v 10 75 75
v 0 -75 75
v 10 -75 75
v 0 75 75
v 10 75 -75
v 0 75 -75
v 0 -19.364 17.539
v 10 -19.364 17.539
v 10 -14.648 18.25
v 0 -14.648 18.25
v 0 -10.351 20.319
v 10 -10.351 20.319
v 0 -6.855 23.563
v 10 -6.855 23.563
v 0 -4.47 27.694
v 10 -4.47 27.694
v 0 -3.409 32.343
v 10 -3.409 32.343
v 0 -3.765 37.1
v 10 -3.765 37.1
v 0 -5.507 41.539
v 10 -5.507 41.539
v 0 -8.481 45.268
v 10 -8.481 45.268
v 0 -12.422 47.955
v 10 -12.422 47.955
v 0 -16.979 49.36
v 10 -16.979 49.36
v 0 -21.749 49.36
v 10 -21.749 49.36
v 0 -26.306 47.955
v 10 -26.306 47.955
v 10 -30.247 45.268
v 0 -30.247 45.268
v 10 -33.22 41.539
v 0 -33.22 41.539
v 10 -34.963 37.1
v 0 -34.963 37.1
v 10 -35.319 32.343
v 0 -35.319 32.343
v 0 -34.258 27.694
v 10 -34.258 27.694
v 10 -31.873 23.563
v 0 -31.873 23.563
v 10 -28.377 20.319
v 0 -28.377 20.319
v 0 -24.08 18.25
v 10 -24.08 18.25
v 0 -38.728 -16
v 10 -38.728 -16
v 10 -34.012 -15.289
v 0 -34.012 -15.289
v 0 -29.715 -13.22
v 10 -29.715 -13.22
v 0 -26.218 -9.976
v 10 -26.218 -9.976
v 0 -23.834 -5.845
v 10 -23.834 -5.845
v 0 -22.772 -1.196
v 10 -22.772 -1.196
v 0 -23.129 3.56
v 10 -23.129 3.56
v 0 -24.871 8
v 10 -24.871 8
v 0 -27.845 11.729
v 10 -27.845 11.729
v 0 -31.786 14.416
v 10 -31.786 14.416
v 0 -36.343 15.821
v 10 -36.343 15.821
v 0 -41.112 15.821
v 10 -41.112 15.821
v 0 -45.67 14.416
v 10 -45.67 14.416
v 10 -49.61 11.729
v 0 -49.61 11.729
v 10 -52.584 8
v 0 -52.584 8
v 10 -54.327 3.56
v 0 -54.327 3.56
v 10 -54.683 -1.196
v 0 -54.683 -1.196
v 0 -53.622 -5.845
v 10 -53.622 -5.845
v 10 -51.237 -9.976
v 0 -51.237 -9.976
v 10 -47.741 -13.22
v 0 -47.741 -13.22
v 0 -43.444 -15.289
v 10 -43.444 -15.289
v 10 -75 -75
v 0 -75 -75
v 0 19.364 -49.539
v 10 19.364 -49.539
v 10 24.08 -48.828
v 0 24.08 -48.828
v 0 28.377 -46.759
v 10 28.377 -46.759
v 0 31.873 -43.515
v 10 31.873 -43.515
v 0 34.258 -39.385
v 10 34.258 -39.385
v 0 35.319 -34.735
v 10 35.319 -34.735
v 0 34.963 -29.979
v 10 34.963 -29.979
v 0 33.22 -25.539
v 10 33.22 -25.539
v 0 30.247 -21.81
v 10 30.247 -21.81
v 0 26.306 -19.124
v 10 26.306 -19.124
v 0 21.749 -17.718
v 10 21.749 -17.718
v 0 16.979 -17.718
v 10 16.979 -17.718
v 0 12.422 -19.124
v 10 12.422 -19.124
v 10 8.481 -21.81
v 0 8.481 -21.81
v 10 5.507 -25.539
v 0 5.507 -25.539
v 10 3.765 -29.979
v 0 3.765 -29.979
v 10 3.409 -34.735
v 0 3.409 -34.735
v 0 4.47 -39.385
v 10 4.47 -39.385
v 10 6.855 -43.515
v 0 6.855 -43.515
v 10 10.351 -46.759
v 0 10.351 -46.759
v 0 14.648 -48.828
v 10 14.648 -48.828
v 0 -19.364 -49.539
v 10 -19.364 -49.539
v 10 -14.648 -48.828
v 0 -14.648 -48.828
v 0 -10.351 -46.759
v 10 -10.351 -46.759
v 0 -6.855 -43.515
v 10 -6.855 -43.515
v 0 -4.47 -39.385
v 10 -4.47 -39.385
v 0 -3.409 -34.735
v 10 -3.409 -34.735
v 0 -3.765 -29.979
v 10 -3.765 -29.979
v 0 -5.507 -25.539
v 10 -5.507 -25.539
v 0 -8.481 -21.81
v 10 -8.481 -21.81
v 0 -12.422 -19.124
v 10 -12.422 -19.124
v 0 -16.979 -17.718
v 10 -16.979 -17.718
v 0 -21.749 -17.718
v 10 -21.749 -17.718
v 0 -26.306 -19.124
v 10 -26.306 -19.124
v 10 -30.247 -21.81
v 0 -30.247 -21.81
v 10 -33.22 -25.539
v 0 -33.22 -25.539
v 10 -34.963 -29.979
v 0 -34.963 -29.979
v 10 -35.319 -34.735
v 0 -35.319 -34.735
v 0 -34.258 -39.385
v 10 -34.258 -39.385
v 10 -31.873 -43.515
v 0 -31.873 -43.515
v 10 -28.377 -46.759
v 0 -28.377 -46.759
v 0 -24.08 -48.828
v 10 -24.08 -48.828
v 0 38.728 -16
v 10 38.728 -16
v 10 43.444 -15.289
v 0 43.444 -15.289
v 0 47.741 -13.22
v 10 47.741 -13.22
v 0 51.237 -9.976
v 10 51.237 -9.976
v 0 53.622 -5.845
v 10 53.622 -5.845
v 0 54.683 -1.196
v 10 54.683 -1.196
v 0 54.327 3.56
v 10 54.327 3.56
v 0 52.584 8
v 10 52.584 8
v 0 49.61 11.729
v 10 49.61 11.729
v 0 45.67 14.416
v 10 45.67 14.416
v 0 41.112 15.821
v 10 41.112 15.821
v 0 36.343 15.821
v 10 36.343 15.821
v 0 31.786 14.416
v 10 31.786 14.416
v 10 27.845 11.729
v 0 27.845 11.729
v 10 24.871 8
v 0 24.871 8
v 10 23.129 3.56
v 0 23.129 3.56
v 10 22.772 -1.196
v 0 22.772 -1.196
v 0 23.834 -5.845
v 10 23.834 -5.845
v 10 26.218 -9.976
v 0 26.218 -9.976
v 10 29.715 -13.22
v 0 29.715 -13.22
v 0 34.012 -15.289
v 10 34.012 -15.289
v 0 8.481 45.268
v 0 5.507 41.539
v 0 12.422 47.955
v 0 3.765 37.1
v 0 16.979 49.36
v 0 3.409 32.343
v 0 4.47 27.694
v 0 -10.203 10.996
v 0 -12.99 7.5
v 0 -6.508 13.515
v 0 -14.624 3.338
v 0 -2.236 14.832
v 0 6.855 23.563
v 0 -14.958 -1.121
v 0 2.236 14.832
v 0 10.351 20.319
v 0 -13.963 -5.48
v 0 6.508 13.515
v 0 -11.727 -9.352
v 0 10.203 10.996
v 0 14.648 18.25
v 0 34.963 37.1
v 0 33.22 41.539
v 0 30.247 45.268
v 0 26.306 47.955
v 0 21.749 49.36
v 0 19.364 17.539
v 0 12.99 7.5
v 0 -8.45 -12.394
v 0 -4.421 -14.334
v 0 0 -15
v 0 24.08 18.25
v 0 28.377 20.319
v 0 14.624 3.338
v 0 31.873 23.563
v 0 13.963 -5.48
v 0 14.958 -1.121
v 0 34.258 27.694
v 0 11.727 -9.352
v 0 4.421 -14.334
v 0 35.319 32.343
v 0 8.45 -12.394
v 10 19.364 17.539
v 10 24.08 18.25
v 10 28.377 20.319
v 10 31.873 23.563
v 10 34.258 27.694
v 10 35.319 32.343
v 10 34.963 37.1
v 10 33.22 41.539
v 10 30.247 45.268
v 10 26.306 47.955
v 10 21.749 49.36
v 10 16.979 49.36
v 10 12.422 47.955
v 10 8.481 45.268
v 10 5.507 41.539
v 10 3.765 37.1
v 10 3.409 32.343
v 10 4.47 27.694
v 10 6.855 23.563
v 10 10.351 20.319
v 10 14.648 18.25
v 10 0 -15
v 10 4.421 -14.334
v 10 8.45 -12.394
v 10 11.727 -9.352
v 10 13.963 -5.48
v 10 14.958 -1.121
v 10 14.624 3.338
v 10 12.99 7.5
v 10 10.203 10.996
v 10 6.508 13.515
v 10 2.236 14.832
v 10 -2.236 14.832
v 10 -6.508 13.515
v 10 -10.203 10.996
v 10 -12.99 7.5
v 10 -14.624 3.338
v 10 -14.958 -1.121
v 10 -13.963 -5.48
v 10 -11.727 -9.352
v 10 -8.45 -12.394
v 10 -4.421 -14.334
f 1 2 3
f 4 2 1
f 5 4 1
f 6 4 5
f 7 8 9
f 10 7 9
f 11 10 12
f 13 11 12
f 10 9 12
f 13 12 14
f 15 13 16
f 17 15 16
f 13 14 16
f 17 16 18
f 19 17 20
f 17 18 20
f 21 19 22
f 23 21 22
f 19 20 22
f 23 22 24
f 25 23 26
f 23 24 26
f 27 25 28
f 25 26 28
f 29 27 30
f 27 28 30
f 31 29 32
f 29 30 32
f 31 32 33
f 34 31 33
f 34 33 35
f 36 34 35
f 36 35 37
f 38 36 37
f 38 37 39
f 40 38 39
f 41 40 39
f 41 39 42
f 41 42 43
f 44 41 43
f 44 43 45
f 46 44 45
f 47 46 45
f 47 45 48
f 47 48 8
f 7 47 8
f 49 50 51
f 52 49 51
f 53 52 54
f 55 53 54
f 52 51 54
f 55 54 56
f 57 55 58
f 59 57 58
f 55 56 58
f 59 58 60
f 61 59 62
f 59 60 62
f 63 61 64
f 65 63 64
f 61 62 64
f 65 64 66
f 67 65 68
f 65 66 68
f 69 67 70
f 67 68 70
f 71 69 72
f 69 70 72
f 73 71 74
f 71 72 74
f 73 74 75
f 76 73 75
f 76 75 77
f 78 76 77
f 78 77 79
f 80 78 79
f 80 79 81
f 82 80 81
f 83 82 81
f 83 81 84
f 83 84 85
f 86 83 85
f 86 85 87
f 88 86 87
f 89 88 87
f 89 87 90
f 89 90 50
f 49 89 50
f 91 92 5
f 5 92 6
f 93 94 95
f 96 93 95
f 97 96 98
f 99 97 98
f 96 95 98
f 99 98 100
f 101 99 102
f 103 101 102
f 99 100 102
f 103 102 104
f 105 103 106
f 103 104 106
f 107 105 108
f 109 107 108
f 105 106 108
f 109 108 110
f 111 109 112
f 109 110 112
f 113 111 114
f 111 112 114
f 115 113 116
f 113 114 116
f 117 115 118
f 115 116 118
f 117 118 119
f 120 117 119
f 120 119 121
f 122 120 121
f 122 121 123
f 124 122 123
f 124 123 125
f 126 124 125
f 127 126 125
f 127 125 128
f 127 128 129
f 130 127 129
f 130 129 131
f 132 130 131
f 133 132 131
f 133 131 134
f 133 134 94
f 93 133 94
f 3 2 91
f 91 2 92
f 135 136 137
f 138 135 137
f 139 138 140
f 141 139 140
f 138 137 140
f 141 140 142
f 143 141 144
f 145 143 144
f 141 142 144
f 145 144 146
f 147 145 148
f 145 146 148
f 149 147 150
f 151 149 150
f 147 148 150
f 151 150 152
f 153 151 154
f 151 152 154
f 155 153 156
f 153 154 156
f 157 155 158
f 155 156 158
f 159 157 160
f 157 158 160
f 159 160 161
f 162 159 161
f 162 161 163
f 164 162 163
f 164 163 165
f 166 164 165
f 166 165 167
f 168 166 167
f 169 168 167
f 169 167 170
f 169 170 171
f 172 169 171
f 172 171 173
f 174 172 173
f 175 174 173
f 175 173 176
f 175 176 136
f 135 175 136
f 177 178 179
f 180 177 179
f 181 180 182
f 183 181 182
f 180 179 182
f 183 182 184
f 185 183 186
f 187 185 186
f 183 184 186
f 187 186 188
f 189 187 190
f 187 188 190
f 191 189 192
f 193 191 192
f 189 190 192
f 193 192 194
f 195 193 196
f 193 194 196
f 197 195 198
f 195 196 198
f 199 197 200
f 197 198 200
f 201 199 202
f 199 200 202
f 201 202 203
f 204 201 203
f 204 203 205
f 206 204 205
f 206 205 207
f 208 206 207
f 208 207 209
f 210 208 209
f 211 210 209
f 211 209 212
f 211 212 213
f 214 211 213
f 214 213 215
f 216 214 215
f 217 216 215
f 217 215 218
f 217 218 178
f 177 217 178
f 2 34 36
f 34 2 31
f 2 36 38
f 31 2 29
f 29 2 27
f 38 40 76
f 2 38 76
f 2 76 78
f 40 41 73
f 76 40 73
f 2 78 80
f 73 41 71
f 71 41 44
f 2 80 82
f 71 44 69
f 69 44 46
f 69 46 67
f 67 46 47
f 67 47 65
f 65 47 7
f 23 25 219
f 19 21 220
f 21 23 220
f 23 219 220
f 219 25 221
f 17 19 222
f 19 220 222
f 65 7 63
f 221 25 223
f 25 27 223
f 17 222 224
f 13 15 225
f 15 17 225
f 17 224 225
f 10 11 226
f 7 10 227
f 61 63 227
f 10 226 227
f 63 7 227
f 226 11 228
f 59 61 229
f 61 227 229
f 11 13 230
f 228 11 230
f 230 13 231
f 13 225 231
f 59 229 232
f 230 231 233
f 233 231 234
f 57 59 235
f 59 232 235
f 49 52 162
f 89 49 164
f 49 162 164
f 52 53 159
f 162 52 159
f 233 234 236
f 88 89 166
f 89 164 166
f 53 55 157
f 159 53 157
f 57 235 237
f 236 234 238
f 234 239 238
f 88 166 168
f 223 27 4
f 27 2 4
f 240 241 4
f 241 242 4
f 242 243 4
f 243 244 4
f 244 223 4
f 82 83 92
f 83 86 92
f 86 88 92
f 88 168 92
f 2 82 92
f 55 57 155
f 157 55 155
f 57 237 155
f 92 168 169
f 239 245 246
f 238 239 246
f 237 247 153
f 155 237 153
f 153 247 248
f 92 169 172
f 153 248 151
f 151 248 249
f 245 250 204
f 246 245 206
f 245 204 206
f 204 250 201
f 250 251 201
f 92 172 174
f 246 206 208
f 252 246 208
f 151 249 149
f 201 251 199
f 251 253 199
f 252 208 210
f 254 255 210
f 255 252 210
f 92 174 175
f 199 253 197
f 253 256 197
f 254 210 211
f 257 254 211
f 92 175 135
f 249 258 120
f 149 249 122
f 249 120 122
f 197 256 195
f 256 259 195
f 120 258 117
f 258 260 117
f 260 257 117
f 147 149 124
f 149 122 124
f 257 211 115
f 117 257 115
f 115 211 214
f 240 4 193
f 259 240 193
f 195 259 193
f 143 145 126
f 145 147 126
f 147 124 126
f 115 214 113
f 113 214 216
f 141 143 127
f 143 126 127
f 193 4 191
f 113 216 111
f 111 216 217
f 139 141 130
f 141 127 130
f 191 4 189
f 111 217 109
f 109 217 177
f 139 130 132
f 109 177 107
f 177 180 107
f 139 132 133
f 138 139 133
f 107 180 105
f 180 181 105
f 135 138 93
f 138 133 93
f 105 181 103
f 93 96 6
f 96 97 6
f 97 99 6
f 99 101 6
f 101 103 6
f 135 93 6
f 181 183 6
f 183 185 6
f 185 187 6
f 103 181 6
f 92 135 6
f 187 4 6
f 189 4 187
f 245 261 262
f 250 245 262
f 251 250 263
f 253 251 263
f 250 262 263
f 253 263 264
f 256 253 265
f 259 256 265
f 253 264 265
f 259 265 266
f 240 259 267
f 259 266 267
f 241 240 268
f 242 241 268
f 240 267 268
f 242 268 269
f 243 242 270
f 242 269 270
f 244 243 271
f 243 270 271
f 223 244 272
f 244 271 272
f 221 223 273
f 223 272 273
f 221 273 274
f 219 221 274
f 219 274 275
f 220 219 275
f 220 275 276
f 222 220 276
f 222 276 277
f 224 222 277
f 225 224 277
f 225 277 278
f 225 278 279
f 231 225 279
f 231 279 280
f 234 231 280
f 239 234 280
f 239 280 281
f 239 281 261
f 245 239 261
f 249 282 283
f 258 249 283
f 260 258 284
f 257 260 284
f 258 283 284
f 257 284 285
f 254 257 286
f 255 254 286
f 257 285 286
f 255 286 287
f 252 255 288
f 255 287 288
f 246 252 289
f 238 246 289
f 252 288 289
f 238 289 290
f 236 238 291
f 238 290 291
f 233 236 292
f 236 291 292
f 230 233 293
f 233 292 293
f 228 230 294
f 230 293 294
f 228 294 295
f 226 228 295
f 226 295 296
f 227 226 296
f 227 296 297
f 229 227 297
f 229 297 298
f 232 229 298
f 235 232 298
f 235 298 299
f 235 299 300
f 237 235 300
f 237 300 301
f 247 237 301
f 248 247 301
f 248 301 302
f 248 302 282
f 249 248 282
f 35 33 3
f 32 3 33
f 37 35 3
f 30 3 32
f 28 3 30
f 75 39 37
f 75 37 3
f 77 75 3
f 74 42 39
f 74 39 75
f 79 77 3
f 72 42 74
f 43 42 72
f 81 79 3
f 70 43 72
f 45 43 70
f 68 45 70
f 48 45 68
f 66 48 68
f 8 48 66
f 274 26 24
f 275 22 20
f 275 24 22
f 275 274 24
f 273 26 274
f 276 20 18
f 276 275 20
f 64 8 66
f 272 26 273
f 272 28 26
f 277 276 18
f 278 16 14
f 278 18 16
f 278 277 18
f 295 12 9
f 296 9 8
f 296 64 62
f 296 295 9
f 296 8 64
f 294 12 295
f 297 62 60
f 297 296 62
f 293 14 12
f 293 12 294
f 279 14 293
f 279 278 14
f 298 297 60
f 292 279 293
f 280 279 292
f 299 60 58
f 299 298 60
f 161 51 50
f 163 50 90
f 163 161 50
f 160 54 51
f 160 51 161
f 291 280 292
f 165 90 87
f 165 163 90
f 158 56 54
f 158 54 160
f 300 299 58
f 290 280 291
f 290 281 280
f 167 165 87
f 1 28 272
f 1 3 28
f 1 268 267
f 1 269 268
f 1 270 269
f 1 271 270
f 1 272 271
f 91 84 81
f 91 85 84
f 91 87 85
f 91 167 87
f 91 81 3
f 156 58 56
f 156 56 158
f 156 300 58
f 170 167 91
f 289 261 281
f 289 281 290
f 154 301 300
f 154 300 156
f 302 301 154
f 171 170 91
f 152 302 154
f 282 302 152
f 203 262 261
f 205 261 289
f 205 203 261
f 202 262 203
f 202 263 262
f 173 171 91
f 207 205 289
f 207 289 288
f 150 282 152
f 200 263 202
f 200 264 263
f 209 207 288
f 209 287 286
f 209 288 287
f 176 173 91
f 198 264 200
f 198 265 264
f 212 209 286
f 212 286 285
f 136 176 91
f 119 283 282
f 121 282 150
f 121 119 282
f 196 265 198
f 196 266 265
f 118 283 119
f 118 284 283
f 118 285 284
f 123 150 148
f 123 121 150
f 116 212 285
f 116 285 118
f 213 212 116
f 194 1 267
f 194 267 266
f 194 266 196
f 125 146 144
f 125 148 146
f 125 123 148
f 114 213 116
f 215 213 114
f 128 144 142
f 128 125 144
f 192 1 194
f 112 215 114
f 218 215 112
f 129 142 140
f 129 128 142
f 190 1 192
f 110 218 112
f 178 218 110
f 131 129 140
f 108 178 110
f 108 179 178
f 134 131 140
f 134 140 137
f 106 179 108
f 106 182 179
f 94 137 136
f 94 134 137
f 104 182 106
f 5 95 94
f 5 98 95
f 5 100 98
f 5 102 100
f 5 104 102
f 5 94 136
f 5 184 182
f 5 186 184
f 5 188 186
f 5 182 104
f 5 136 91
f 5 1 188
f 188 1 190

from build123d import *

# Parameters (mm, degrees)
SKETCH1_W           = 150
SKETCH1_H           = 150
BOSS_EXTRUDE1_DEPTH = 10
SKETCH2_R           = 15
SKETCH2_R_2         = 16
CUT_EXTRUDE1_DEPTH  = 25


with BuildPart() as part:
    # Sketch1 → Boss-Extrude1 (new body)
    with BuildSketch(Plane(origin=(0, 0, 0), x_dir=(0, 0, -1), z_dir=(1, 0, 0))):
        Rectangle(SKETCH1_W, SKETCH1_H)
    extrude(amount=BOSS_EXTRUDE1_DEPTH)

    # Sketch2 → Cut-Extrude1 (cut)
    with BuildSketch(Plane(origin=(10, 0, 0), x_dir=(0, 0, -1), z_dir=(1, 0, 0))):
        Circle(SKETCH2_R)
        with Locations((0, 38.727703316)):
            Circle(SKETCH2_R_2)
        with Locations((33.539174902, 19.363851658)):
            Circle(SKETCH2_R_2)
        with Locations((33.539174902, -19.363851658)):
            Circle(SKETCH2_R_2)
        with Locations((0, -38.727703316)):
            Circle(SKETCH2_R_2)
        with Locations((-33.539174902, -19.363851658)):
            Circle(SKETCH2_R_2)
        with Locations((-33.539174902, 19.363851658)):
            Circle(SKETCH2_R_2)
    extrude(amount=-CUT_EXTRUDE1_DEPTH, mode=Mode.SUBTRACT)


solid = part.part
